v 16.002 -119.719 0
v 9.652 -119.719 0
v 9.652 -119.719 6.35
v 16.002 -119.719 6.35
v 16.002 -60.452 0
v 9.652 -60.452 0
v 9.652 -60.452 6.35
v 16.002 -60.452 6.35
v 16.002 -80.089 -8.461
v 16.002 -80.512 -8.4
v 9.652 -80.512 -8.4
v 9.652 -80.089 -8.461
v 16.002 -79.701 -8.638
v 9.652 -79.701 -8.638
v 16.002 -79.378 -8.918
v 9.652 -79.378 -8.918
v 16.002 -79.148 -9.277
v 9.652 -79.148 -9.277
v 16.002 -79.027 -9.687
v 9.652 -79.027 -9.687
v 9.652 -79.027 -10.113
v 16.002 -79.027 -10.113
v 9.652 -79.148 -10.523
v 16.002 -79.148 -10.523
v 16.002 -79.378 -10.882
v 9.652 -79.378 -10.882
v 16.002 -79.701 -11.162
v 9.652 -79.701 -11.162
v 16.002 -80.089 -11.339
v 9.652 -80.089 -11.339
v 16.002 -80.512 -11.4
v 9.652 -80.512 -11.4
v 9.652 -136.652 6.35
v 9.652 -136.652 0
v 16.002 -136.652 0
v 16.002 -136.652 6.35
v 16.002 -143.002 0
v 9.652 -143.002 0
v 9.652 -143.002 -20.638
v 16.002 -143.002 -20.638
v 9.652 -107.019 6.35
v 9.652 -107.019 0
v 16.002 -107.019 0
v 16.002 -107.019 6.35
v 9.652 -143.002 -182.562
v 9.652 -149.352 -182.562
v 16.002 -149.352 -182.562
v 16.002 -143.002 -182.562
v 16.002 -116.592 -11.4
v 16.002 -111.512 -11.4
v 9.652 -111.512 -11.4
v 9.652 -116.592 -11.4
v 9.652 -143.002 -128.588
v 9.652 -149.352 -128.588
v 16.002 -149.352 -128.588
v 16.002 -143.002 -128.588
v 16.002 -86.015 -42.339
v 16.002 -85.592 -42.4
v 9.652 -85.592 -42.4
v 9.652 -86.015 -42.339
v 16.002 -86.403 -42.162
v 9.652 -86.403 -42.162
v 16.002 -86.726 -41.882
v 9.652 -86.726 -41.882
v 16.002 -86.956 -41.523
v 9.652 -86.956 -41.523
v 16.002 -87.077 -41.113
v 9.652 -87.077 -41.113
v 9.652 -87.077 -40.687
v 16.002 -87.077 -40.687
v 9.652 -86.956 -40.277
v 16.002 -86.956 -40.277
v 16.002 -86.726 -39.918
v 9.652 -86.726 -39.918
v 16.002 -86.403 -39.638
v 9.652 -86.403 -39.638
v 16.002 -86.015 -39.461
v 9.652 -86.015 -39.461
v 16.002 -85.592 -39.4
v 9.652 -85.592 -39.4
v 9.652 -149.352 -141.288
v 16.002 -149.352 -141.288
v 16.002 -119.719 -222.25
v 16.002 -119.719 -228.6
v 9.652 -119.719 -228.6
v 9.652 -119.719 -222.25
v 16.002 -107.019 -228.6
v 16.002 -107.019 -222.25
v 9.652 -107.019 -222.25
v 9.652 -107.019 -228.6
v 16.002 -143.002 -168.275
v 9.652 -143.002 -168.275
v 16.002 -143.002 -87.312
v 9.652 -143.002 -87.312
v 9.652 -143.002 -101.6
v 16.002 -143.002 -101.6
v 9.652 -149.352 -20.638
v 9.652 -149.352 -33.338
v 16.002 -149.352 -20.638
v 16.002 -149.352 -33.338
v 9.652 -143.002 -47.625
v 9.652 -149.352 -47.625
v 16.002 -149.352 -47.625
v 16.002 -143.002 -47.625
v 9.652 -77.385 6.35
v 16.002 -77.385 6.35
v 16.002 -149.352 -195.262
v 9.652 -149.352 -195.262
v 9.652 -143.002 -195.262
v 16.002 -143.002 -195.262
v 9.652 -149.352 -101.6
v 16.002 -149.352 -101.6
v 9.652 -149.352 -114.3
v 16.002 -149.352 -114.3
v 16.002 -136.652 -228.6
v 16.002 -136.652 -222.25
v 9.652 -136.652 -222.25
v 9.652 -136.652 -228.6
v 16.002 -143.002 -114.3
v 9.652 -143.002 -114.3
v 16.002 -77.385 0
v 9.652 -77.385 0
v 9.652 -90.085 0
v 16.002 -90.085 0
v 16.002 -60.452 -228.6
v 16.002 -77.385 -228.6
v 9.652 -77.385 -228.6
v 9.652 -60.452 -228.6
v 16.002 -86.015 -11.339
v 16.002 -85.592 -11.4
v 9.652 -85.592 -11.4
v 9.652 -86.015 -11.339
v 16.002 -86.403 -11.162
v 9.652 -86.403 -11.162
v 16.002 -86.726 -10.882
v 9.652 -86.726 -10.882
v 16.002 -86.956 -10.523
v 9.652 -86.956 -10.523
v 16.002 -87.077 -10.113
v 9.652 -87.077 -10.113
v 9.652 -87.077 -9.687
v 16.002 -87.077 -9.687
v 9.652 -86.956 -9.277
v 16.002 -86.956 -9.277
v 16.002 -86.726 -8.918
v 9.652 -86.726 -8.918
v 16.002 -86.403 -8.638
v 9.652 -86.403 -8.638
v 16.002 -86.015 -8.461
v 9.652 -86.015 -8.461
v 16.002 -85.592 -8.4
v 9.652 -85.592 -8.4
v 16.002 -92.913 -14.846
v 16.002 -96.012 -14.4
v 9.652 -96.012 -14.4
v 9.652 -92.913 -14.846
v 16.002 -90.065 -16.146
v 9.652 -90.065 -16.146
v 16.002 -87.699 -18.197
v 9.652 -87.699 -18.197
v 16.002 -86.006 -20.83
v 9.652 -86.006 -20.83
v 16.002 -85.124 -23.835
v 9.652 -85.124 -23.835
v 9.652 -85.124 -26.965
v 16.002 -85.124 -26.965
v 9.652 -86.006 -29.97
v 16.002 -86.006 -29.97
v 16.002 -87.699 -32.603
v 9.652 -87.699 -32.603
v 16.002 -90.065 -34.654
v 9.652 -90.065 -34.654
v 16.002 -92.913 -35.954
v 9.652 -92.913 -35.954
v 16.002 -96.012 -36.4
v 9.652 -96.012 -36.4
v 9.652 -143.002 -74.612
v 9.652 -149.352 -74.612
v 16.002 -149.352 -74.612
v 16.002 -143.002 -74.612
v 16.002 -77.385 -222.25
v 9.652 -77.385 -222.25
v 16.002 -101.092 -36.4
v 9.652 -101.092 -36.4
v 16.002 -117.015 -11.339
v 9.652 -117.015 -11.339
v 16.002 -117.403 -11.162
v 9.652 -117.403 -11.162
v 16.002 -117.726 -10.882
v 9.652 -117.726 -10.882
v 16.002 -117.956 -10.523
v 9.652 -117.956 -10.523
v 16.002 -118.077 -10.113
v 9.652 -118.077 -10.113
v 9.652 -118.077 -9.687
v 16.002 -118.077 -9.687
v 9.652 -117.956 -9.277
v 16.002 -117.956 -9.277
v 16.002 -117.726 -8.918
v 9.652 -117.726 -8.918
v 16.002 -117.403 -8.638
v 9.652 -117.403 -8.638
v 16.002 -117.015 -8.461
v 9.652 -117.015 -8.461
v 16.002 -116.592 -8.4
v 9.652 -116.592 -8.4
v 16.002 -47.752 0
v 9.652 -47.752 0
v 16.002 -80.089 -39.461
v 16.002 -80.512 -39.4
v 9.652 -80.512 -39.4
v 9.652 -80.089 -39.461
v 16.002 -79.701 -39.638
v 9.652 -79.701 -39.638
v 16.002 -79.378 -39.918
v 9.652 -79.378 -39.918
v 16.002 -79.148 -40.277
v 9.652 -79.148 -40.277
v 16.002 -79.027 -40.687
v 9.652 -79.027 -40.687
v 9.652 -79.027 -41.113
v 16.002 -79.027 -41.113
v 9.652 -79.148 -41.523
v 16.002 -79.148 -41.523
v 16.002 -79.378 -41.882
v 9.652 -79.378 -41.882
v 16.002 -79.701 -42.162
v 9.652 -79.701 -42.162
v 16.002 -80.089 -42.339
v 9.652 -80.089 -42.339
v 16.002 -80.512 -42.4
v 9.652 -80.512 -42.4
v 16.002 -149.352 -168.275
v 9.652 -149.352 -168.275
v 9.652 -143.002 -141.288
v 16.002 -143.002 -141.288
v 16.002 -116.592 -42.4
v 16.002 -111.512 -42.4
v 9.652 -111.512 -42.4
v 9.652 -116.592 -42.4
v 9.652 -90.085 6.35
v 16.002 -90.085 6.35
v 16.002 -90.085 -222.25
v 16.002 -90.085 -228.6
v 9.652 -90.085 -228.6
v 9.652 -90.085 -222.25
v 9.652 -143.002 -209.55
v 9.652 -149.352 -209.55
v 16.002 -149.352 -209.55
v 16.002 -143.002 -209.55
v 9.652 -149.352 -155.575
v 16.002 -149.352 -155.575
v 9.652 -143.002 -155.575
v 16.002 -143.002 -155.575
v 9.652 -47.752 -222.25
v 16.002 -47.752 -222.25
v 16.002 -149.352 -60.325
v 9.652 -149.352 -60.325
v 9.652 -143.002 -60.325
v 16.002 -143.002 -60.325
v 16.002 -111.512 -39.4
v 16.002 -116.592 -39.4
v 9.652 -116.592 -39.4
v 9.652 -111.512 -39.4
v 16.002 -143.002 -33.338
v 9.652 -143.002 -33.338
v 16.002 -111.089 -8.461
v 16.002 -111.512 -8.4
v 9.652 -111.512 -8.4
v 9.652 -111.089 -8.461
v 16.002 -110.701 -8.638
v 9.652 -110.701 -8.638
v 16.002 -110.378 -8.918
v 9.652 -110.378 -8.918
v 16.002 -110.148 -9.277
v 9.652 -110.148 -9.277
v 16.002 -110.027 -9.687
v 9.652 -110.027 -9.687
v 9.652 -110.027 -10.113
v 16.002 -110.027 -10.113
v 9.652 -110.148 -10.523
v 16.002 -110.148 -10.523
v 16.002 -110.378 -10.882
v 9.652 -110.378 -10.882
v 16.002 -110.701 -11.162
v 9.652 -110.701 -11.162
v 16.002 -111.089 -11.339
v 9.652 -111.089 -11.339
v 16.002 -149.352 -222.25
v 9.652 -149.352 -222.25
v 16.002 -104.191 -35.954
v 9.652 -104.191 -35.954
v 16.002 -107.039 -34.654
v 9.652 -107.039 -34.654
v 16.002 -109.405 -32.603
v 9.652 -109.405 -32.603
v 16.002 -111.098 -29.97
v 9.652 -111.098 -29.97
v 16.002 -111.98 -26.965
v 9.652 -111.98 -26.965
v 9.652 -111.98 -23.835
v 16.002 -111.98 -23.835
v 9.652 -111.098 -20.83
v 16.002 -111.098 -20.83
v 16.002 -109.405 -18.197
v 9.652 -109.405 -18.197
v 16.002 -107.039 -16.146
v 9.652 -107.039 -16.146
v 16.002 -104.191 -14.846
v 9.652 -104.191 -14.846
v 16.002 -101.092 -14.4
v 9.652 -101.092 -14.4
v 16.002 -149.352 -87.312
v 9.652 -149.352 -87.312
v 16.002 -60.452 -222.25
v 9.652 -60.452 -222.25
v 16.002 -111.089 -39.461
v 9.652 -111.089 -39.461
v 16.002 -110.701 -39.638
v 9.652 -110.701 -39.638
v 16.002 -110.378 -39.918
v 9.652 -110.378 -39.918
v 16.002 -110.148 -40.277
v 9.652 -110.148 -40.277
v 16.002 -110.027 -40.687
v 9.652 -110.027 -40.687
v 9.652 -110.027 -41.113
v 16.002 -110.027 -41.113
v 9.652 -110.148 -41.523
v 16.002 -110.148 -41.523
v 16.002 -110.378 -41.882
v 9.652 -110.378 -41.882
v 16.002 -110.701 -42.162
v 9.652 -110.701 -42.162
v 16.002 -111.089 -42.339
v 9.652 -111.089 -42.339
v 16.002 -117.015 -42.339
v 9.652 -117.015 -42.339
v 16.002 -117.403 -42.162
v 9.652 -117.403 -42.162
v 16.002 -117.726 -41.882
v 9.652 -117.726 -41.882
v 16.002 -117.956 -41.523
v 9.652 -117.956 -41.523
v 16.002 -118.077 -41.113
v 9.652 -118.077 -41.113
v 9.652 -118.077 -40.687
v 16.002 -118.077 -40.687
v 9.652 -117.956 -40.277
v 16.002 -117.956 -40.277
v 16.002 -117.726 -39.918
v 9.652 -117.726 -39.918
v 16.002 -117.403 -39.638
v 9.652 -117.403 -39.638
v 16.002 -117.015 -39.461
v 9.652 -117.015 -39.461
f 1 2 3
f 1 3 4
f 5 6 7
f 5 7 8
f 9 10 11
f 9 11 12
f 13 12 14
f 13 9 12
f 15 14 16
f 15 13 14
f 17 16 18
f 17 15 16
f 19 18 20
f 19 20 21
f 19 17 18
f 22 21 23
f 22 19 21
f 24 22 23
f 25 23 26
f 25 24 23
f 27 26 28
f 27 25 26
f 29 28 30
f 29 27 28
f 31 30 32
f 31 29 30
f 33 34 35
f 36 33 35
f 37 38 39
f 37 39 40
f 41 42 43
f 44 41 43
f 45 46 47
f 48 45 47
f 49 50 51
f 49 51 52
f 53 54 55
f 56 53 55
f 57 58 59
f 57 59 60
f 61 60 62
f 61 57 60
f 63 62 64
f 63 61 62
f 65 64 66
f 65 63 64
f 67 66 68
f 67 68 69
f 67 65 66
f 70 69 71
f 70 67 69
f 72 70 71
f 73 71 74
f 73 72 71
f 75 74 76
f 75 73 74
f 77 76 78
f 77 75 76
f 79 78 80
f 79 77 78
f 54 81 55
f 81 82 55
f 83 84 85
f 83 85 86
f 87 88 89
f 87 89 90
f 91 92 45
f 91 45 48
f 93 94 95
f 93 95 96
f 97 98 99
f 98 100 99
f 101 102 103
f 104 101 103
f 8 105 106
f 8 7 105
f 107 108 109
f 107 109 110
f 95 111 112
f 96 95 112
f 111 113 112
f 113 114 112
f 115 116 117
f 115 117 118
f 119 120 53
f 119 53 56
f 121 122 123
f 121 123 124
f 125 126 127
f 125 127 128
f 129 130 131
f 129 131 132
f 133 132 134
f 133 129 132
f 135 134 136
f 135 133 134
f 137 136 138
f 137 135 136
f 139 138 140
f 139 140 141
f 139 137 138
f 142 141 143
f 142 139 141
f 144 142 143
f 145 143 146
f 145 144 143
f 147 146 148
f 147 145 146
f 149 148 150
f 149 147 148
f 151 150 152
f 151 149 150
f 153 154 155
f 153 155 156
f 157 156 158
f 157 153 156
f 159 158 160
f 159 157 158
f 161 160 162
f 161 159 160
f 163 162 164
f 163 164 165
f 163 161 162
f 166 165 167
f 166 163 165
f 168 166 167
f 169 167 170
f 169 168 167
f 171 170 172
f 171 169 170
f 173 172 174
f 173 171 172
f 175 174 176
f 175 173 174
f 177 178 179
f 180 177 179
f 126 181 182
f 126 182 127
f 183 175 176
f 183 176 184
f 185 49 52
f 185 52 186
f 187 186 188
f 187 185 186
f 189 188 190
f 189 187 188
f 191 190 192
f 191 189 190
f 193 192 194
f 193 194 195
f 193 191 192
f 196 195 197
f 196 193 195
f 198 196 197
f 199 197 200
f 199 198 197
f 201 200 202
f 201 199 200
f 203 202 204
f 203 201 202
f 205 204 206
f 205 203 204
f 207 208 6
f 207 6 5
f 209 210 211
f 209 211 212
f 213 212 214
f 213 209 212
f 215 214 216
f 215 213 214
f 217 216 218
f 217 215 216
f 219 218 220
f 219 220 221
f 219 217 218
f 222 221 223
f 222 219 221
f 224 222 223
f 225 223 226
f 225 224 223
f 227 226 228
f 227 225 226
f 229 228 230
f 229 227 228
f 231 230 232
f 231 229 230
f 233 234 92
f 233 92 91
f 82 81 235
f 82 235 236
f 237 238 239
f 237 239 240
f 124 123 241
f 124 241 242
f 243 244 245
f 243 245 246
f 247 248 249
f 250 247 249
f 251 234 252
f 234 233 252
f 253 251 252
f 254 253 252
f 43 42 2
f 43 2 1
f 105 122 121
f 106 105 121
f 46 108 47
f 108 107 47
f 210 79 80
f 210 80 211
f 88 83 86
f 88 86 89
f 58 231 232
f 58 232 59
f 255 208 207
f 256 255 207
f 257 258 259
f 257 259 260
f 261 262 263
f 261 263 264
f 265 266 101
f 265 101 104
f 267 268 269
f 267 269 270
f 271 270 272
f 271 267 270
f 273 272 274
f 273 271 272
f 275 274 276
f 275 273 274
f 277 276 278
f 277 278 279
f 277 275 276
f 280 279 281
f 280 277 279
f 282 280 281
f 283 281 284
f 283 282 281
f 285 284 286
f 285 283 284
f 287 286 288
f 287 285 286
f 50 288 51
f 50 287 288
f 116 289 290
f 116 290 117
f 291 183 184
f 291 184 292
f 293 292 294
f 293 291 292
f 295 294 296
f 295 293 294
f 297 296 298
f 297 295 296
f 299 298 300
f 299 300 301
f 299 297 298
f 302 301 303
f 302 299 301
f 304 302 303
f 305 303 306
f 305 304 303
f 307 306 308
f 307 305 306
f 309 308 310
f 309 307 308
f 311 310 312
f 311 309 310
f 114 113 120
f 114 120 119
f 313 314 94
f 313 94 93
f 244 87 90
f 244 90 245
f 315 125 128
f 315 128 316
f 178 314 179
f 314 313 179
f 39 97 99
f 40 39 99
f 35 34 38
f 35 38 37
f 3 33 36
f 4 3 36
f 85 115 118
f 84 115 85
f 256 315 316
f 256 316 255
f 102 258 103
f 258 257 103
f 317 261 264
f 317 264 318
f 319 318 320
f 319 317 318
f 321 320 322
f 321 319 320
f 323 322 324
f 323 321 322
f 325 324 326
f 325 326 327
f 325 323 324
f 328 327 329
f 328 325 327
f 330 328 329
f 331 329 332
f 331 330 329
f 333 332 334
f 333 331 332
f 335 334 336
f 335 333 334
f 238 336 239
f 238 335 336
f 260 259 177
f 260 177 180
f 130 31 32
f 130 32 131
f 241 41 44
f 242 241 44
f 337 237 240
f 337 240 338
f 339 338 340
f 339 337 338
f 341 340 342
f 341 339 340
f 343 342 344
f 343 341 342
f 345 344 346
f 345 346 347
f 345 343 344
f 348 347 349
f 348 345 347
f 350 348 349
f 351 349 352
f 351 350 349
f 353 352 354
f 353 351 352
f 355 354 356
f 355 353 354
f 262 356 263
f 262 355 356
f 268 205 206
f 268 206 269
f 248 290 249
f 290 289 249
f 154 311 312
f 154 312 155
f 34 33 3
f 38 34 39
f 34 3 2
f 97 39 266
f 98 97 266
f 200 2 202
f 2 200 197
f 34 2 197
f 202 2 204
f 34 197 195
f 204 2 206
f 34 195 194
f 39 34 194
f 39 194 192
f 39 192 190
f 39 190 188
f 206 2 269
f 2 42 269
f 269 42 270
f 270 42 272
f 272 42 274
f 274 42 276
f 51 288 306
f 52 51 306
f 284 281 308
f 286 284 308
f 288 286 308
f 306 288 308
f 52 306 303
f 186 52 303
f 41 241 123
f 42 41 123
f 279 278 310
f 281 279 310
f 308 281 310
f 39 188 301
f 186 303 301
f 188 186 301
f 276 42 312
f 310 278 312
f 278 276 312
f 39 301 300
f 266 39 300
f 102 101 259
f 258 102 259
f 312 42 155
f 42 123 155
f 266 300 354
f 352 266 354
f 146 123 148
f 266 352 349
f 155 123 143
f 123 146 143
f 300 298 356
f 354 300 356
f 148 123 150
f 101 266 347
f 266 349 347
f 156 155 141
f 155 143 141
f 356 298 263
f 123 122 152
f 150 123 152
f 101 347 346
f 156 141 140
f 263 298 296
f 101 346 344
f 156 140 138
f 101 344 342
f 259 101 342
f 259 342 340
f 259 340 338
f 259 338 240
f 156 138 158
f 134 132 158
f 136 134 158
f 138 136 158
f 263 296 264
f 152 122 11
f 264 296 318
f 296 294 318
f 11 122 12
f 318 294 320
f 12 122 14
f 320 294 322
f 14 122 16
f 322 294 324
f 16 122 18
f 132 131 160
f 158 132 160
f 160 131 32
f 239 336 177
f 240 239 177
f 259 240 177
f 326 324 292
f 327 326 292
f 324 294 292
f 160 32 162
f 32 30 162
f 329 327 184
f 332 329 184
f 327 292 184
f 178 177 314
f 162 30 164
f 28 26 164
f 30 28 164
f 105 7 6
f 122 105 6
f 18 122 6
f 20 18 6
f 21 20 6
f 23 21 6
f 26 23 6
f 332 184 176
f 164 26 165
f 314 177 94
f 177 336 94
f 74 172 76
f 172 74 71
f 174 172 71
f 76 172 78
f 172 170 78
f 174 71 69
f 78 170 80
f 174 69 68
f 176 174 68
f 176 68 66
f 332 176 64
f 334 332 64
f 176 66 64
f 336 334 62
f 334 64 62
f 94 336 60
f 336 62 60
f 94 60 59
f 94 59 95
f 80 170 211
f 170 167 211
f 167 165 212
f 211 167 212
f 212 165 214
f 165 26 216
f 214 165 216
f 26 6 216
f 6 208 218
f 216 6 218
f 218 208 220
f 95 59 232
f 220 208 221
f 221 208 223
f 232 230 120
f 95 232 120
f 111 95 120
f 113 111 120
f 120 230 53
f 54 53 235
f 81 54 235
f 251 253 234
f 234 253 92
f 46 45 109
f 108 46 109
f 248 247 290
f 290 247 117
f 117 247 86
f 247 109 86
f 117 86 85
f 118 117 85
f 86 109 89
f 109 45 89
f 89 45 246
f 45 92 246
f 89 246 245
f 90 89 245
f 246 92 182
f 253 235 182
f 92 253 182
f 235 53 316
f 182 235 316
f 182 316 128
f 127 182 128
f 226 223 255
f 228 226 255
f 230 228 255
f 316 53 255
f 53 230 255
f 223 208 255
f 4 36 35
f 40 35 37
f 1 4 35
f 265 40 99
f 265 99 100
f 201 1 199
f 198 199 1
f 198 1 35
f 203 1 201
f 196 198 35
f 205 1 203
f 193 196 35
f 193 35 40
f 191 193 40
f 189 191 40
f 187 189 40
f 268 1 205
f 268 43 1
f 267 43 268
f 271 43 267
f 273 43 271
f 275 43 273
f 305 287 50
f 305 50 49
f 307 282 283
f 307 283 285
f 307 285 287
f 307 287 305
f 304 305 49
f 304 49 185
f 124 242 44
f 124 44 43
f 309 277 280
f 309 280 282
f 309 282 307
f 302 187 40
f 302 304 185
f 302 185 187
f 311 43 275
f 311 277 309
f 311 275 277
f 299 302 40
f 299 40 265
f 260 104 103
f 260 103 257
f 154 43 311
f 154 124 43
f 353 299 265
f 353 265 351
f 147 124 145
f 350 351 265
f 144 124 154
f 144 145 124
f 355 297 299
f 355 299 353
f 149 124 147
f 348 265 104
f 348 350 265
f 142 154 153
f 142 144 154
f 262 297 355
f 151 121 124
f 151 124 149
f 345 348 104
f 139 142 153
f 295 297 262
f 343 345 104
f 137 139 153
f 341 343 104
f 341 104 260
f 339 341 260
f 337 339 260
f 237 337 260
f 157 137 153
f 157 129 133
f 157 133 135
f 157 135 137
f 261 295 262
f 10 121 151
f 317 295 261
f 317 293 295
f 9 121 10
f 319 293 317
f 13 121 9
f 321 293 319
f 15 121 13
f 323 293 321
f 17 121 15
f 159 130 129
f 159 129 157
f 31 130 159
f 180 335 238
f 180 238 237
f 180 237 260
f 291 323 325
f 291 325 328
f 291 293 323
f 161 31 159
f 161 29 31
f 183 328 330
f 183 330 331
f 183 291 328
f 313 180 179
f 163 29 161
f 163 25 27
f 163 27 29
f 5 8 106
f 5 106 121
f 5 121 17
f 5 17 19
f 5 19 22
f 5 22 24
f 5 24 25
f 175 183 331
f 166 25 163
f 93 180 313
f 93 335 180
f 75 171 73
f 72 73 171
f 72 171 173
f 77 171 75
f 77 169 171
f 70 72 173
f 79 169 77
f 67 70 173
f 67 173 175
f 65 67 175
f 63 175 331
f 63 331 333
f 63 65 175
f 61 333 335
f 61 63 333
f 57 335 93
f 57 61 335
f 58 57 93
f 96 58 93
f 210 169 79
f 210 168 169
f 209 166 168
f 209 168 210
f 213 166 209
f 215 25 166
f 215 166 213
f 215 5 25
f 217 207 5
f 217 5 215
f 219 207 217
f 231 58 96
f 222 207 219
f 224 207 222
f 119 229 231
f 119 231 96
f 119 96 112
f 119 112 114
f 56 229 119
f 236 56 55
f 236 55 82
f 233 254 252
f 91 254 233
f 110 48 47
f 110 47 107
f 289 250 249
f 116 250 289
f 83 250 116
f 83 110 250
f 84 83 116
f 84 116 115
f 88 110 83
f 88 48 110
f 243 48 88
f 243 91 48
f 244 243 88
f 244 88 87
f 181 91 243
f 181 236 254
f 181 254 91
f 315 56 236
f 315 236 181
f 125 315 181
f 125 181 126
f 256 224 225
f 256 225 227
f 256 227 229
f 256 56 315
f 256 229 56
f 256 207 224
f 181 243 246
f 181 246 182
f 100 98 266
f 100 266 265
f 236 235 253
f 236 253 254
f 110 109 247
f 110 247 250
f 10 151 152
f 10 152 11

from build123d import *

# Parameters (mm, degrees)
SKETCH1_W               = 44.958
SKETCH1_H               = 304.8
BOSS_EXTRUDE1_DEPTH     = 6.35
SKETCH2_W               = 6.35
SKETCH2_H               = 101.6
BOSS_EXTRUDE2_DEPTH     = 6.35
SKETCH3_W               = 222.25
SKETCH3_H               = 6.35
BOSS_EXTRUDE3_DEPTH     = 38.608
SKETCH8_W               = 6.35
SKETCH8_H               = 213.451350416
CUT_EXTRUDE4_DEPTH      = 1
CUT_EXTRUDE4_DEPTH_BACK = 235.95
SKETCH6_W               = 6.35
SKETCH6_H               = 12.7
CUT_EXTRUDE5_DEPTH      = 6.35
SKETCH4_3_W             = 6.35
SKETCH4_3_H             = 14.2875
SKETCH4_3_H_2           = 6.35
CUT_EXTRUDE6_DEPTH      = 6.35


with BuildPart() as part:
    # Sketch1 → Boss-Extrude1 (new body)
    with BuildSketch(Plane.XY):
        with Locations((-6.477, 3.048)):
            Rectangle(SKETCH1_W, SKETCH1_H)
        with BuildLine():
            Line((-3.302, 133.858), (-3.302, -143.002))
            Line((-3.302, -143.002), (3.302, -143.002))
            Line((3.302, -143.002), (3.302, 143.002))
            Line((3.302, 143.002), (-16.256, 143.002))
            Line((-16.256, 143.002), (-16.256, 136.398))
            Line((-16.256, 136.398), (-5.842, 136.398))
            ThreePointArc((-5.842, 136.398), (-4.045948776, 135.654051224), (-3.302, 133.858))
        make_face(mode=Mode.SUBTRACT)
    extrude(amount=BOSS_EXTRUDE1_DEPTH)

    # Sketch2 → Boss-Extrude2 (add)
    with BuildSketch(Plane(origin=(16.002, 0, 0), x_dir=(0, 0, -1), z_dir=(1, 0, 0))):
        Polygon((222.25, -60.452), (222.25, -47.752), (0, -47.752), (0, -149.352), (222.25, -149.352), (222.25, -136.652), (228.6, -136.652), (228.6, -119.718666667), (222.25, -119.718666667), (222.25, -107.018666667), (228.6, -107.018666667), (228.6, -90.085333333), (222.25, -90.085333333), (222.25, -77.385333333), (228.6, -77.385333333), (228.6, -60.452), align=None)
        with BuildLine():
            ThreePointArc((11.4, -116.592), (9.9, -118.092), (8.4, -116.592))
            Line((8.4, -116.592), (8.4, -111.512))
            ThreePointArc((8.4, -111.512), (9.9, -110.012), (11.4, -111.512))
            Line((11.4, -111.512), (11.4, -116.592))
        make_face(mode=Mode.SUBTRACT)
        with BuildLine():
            Line((42.4, -111.512), (42.4, -116.592))
            ThreePointArc((42.4, -116.592), (40.9, -118.092), (39.4, -116.592))
            Line((39.4, -116.592), (39.4, -111.512))
            ThreePointArc((39.4, -111.512), (40.9, -110.012), (42.4, -111.512))
        make_face(mode=Mode.SUBTRACT)
        with BuildLine():
            ThreePointArc((36.4, -101.092), (25.4, -112.092), (14.4, -101.092))
            Line((14.4, -101.092), (14.4, -96.012))
            ThreePointArc((14.4, -96.012), (25.4, -85.012), (36.4, -96.012))
            Line((36.4, -96.012), (36.4, -101.092))
        make_face(mode=Mode.SUBTRACT)
        with BuildLine():
            ThreePointArc((11.4, -85.592), (9.9, -87.092), (8.4, -85.592))
            Line((8.4, -85.592), (8.4, -80.512))
            ThreePointArc((8.4, -80.512), (9.9, -79.012), (11.4, -80.512))
            Line((11.4, -80.512), (11.4, -85.592))
        make_face(mode=Mode.SUBTRACT)
        with BuildLine():
            ThreePointArc((42.4, -85.592), (40.9, -87.092), (39.4, -85.592))
            Line((39.4, -85.592), (39.4, -80.512))
            ThreePointArc((39.4, -80.512), (40.9, -79.012), (42.4, -80.512))
            Line((42.4, -80.512), (42.4, -85.592))
        make_face(mode=Mode.SUBTRACT)
        with Locations((-3.175, -98.552)):
            Rectangle(SKETCH2_W, SKETCH2_H)
    extrude(amount=-BOSS_EXTRUDE2_DEPTH)

    # Sketch3 → Boss-Extrude3 (add)
    with BuildSketch(Plane.ZY.offset(-9.652)):
        with Locations((-111.125, -146.177)):
            Rectangle(SKETCH3_W, SKETCH3_H)
    extrude(amount=BOSS_EXTRUDE3_DEPTH)

    # Sketch8 → Cut-Extrude4 (cut, two sides)
    with BuildSketch(Plane.XY.offset(6.35)) as cut_extrude4_sk:
        Polygon((-28.956, -149.352), (9.652, -149.352), (9.652, -47.752), (9.652, 155.448), (-28.956, 155.448), align=None)
        with BuildLine():
            Line((-16.256, 136.398), (-16.256, 143.002))
            Line((-16.256, 143.002), (3.302, 143.002))
            Line((3.302, 143.002), (3.302, -143.002))
            Line((3.302, -143.002), (-3.302, -143.002))
            Line((-3.302, -143.002), (-3.302, 133.858))
            ThreePointArc((-3.302, 133.858), (-4.045948776, 135.654051224), (-5.842, 136.398))
            Line((-5.842, 136.398), (-16.256, 136.398))
        make_face(mode=Mode.SUBTRACT)
        Polygon((-54.223542679, -149.352), (-28.956, -149.352), (-28.956, 155.448), (9.652, 155.448), (9.652, 165.699350416), (-54.223542679, 165.699350416), align=None)
        with Locations((12.827, 58.973675208)):
            Rectangle(SKETCH8_W, SKETCH8_H)
    extrude(amount=CUT_EXTRUDE4_DEPTH, mode=Mode.SUBTRACT)
    extrude(cut_extrude4_sk.sketch, amount=-CUT_EXTRUDE4_DEPTH_BACK, mode=Mode.SUBTRACT)

    # Sketch6 → Cut-Extrude5 (cut)
    with BuildSketch(Plane.XY.offset(6.35)):
        with Locations((12.827, -54.102)):
            Rectangle(SKETCH6_W, SKETCH6_H)
        with Locations((12.827, -83.735333333)):
            Rectangle(SKETCH6_W, SKETCH6_H)
        with Locations((12.827, -113.368666667)):
            Rectangle(SKETCH6_W, SKETCH6_H)
        with Locations((12.827, -143.002)):
            Rectangle(SKETCH6_W, SKETCH6_H)
    extrude(amount=-CUT_EXTRUDE5_DEPTH, mode=Mode.SUBTRACT)

    # Sketch4<3> → Cut-Extrude6 (cut)
    with BuildSketch(Plane.XZ.offset(149.352)):
        with Locations((12.827, -13.49375)):
            Rectangle(SKETCH4_3_W, SKETCH4_3_H)
        with Locations((12.827, -40.48125)):
            Rectangle(SKETCH4_3_W, SKETCH4_3_H)
        with Locations((12.827, -67.46875)):
            Rectangle(SKETCH4_3_W, SKETCH4_3_H)
        with Locations((12.827, -94.45625)):
            Rectangle(SKETCH4_3_W, SKETCH4_3_H)
        with Locations((12.827, -121.44375)):
            Rectangle(SKETCH4_3_W, SKETCH4_3_H)
        with Locations((12.827, -148.43125)):
            Rectangle(SKETCH4_3_W, SKETCH4_3_H)
        with Locations((12.827, -175.41875)):
            Rectangle(SKETCH4_3_W, SKETCH4_3_H)
        with Locations((12.827, -202.40625)):
            Rectangle(SKETCH4_3_W, SKETCH4_3_H)
        with Locations((12.827, -3.175)):
            Rectangle(SKETCH4_3_W, SKETCH4_3_H_2)
        with Locations((12.827, 3.175)):
            Rectangle(SKETCH4_3_W, SKETCH4_3_H_2)
    extrude(amount=-CUT_EXTRUDE6_DEPTH, mode=Mode.SUBTRACT)


solid = part.part
